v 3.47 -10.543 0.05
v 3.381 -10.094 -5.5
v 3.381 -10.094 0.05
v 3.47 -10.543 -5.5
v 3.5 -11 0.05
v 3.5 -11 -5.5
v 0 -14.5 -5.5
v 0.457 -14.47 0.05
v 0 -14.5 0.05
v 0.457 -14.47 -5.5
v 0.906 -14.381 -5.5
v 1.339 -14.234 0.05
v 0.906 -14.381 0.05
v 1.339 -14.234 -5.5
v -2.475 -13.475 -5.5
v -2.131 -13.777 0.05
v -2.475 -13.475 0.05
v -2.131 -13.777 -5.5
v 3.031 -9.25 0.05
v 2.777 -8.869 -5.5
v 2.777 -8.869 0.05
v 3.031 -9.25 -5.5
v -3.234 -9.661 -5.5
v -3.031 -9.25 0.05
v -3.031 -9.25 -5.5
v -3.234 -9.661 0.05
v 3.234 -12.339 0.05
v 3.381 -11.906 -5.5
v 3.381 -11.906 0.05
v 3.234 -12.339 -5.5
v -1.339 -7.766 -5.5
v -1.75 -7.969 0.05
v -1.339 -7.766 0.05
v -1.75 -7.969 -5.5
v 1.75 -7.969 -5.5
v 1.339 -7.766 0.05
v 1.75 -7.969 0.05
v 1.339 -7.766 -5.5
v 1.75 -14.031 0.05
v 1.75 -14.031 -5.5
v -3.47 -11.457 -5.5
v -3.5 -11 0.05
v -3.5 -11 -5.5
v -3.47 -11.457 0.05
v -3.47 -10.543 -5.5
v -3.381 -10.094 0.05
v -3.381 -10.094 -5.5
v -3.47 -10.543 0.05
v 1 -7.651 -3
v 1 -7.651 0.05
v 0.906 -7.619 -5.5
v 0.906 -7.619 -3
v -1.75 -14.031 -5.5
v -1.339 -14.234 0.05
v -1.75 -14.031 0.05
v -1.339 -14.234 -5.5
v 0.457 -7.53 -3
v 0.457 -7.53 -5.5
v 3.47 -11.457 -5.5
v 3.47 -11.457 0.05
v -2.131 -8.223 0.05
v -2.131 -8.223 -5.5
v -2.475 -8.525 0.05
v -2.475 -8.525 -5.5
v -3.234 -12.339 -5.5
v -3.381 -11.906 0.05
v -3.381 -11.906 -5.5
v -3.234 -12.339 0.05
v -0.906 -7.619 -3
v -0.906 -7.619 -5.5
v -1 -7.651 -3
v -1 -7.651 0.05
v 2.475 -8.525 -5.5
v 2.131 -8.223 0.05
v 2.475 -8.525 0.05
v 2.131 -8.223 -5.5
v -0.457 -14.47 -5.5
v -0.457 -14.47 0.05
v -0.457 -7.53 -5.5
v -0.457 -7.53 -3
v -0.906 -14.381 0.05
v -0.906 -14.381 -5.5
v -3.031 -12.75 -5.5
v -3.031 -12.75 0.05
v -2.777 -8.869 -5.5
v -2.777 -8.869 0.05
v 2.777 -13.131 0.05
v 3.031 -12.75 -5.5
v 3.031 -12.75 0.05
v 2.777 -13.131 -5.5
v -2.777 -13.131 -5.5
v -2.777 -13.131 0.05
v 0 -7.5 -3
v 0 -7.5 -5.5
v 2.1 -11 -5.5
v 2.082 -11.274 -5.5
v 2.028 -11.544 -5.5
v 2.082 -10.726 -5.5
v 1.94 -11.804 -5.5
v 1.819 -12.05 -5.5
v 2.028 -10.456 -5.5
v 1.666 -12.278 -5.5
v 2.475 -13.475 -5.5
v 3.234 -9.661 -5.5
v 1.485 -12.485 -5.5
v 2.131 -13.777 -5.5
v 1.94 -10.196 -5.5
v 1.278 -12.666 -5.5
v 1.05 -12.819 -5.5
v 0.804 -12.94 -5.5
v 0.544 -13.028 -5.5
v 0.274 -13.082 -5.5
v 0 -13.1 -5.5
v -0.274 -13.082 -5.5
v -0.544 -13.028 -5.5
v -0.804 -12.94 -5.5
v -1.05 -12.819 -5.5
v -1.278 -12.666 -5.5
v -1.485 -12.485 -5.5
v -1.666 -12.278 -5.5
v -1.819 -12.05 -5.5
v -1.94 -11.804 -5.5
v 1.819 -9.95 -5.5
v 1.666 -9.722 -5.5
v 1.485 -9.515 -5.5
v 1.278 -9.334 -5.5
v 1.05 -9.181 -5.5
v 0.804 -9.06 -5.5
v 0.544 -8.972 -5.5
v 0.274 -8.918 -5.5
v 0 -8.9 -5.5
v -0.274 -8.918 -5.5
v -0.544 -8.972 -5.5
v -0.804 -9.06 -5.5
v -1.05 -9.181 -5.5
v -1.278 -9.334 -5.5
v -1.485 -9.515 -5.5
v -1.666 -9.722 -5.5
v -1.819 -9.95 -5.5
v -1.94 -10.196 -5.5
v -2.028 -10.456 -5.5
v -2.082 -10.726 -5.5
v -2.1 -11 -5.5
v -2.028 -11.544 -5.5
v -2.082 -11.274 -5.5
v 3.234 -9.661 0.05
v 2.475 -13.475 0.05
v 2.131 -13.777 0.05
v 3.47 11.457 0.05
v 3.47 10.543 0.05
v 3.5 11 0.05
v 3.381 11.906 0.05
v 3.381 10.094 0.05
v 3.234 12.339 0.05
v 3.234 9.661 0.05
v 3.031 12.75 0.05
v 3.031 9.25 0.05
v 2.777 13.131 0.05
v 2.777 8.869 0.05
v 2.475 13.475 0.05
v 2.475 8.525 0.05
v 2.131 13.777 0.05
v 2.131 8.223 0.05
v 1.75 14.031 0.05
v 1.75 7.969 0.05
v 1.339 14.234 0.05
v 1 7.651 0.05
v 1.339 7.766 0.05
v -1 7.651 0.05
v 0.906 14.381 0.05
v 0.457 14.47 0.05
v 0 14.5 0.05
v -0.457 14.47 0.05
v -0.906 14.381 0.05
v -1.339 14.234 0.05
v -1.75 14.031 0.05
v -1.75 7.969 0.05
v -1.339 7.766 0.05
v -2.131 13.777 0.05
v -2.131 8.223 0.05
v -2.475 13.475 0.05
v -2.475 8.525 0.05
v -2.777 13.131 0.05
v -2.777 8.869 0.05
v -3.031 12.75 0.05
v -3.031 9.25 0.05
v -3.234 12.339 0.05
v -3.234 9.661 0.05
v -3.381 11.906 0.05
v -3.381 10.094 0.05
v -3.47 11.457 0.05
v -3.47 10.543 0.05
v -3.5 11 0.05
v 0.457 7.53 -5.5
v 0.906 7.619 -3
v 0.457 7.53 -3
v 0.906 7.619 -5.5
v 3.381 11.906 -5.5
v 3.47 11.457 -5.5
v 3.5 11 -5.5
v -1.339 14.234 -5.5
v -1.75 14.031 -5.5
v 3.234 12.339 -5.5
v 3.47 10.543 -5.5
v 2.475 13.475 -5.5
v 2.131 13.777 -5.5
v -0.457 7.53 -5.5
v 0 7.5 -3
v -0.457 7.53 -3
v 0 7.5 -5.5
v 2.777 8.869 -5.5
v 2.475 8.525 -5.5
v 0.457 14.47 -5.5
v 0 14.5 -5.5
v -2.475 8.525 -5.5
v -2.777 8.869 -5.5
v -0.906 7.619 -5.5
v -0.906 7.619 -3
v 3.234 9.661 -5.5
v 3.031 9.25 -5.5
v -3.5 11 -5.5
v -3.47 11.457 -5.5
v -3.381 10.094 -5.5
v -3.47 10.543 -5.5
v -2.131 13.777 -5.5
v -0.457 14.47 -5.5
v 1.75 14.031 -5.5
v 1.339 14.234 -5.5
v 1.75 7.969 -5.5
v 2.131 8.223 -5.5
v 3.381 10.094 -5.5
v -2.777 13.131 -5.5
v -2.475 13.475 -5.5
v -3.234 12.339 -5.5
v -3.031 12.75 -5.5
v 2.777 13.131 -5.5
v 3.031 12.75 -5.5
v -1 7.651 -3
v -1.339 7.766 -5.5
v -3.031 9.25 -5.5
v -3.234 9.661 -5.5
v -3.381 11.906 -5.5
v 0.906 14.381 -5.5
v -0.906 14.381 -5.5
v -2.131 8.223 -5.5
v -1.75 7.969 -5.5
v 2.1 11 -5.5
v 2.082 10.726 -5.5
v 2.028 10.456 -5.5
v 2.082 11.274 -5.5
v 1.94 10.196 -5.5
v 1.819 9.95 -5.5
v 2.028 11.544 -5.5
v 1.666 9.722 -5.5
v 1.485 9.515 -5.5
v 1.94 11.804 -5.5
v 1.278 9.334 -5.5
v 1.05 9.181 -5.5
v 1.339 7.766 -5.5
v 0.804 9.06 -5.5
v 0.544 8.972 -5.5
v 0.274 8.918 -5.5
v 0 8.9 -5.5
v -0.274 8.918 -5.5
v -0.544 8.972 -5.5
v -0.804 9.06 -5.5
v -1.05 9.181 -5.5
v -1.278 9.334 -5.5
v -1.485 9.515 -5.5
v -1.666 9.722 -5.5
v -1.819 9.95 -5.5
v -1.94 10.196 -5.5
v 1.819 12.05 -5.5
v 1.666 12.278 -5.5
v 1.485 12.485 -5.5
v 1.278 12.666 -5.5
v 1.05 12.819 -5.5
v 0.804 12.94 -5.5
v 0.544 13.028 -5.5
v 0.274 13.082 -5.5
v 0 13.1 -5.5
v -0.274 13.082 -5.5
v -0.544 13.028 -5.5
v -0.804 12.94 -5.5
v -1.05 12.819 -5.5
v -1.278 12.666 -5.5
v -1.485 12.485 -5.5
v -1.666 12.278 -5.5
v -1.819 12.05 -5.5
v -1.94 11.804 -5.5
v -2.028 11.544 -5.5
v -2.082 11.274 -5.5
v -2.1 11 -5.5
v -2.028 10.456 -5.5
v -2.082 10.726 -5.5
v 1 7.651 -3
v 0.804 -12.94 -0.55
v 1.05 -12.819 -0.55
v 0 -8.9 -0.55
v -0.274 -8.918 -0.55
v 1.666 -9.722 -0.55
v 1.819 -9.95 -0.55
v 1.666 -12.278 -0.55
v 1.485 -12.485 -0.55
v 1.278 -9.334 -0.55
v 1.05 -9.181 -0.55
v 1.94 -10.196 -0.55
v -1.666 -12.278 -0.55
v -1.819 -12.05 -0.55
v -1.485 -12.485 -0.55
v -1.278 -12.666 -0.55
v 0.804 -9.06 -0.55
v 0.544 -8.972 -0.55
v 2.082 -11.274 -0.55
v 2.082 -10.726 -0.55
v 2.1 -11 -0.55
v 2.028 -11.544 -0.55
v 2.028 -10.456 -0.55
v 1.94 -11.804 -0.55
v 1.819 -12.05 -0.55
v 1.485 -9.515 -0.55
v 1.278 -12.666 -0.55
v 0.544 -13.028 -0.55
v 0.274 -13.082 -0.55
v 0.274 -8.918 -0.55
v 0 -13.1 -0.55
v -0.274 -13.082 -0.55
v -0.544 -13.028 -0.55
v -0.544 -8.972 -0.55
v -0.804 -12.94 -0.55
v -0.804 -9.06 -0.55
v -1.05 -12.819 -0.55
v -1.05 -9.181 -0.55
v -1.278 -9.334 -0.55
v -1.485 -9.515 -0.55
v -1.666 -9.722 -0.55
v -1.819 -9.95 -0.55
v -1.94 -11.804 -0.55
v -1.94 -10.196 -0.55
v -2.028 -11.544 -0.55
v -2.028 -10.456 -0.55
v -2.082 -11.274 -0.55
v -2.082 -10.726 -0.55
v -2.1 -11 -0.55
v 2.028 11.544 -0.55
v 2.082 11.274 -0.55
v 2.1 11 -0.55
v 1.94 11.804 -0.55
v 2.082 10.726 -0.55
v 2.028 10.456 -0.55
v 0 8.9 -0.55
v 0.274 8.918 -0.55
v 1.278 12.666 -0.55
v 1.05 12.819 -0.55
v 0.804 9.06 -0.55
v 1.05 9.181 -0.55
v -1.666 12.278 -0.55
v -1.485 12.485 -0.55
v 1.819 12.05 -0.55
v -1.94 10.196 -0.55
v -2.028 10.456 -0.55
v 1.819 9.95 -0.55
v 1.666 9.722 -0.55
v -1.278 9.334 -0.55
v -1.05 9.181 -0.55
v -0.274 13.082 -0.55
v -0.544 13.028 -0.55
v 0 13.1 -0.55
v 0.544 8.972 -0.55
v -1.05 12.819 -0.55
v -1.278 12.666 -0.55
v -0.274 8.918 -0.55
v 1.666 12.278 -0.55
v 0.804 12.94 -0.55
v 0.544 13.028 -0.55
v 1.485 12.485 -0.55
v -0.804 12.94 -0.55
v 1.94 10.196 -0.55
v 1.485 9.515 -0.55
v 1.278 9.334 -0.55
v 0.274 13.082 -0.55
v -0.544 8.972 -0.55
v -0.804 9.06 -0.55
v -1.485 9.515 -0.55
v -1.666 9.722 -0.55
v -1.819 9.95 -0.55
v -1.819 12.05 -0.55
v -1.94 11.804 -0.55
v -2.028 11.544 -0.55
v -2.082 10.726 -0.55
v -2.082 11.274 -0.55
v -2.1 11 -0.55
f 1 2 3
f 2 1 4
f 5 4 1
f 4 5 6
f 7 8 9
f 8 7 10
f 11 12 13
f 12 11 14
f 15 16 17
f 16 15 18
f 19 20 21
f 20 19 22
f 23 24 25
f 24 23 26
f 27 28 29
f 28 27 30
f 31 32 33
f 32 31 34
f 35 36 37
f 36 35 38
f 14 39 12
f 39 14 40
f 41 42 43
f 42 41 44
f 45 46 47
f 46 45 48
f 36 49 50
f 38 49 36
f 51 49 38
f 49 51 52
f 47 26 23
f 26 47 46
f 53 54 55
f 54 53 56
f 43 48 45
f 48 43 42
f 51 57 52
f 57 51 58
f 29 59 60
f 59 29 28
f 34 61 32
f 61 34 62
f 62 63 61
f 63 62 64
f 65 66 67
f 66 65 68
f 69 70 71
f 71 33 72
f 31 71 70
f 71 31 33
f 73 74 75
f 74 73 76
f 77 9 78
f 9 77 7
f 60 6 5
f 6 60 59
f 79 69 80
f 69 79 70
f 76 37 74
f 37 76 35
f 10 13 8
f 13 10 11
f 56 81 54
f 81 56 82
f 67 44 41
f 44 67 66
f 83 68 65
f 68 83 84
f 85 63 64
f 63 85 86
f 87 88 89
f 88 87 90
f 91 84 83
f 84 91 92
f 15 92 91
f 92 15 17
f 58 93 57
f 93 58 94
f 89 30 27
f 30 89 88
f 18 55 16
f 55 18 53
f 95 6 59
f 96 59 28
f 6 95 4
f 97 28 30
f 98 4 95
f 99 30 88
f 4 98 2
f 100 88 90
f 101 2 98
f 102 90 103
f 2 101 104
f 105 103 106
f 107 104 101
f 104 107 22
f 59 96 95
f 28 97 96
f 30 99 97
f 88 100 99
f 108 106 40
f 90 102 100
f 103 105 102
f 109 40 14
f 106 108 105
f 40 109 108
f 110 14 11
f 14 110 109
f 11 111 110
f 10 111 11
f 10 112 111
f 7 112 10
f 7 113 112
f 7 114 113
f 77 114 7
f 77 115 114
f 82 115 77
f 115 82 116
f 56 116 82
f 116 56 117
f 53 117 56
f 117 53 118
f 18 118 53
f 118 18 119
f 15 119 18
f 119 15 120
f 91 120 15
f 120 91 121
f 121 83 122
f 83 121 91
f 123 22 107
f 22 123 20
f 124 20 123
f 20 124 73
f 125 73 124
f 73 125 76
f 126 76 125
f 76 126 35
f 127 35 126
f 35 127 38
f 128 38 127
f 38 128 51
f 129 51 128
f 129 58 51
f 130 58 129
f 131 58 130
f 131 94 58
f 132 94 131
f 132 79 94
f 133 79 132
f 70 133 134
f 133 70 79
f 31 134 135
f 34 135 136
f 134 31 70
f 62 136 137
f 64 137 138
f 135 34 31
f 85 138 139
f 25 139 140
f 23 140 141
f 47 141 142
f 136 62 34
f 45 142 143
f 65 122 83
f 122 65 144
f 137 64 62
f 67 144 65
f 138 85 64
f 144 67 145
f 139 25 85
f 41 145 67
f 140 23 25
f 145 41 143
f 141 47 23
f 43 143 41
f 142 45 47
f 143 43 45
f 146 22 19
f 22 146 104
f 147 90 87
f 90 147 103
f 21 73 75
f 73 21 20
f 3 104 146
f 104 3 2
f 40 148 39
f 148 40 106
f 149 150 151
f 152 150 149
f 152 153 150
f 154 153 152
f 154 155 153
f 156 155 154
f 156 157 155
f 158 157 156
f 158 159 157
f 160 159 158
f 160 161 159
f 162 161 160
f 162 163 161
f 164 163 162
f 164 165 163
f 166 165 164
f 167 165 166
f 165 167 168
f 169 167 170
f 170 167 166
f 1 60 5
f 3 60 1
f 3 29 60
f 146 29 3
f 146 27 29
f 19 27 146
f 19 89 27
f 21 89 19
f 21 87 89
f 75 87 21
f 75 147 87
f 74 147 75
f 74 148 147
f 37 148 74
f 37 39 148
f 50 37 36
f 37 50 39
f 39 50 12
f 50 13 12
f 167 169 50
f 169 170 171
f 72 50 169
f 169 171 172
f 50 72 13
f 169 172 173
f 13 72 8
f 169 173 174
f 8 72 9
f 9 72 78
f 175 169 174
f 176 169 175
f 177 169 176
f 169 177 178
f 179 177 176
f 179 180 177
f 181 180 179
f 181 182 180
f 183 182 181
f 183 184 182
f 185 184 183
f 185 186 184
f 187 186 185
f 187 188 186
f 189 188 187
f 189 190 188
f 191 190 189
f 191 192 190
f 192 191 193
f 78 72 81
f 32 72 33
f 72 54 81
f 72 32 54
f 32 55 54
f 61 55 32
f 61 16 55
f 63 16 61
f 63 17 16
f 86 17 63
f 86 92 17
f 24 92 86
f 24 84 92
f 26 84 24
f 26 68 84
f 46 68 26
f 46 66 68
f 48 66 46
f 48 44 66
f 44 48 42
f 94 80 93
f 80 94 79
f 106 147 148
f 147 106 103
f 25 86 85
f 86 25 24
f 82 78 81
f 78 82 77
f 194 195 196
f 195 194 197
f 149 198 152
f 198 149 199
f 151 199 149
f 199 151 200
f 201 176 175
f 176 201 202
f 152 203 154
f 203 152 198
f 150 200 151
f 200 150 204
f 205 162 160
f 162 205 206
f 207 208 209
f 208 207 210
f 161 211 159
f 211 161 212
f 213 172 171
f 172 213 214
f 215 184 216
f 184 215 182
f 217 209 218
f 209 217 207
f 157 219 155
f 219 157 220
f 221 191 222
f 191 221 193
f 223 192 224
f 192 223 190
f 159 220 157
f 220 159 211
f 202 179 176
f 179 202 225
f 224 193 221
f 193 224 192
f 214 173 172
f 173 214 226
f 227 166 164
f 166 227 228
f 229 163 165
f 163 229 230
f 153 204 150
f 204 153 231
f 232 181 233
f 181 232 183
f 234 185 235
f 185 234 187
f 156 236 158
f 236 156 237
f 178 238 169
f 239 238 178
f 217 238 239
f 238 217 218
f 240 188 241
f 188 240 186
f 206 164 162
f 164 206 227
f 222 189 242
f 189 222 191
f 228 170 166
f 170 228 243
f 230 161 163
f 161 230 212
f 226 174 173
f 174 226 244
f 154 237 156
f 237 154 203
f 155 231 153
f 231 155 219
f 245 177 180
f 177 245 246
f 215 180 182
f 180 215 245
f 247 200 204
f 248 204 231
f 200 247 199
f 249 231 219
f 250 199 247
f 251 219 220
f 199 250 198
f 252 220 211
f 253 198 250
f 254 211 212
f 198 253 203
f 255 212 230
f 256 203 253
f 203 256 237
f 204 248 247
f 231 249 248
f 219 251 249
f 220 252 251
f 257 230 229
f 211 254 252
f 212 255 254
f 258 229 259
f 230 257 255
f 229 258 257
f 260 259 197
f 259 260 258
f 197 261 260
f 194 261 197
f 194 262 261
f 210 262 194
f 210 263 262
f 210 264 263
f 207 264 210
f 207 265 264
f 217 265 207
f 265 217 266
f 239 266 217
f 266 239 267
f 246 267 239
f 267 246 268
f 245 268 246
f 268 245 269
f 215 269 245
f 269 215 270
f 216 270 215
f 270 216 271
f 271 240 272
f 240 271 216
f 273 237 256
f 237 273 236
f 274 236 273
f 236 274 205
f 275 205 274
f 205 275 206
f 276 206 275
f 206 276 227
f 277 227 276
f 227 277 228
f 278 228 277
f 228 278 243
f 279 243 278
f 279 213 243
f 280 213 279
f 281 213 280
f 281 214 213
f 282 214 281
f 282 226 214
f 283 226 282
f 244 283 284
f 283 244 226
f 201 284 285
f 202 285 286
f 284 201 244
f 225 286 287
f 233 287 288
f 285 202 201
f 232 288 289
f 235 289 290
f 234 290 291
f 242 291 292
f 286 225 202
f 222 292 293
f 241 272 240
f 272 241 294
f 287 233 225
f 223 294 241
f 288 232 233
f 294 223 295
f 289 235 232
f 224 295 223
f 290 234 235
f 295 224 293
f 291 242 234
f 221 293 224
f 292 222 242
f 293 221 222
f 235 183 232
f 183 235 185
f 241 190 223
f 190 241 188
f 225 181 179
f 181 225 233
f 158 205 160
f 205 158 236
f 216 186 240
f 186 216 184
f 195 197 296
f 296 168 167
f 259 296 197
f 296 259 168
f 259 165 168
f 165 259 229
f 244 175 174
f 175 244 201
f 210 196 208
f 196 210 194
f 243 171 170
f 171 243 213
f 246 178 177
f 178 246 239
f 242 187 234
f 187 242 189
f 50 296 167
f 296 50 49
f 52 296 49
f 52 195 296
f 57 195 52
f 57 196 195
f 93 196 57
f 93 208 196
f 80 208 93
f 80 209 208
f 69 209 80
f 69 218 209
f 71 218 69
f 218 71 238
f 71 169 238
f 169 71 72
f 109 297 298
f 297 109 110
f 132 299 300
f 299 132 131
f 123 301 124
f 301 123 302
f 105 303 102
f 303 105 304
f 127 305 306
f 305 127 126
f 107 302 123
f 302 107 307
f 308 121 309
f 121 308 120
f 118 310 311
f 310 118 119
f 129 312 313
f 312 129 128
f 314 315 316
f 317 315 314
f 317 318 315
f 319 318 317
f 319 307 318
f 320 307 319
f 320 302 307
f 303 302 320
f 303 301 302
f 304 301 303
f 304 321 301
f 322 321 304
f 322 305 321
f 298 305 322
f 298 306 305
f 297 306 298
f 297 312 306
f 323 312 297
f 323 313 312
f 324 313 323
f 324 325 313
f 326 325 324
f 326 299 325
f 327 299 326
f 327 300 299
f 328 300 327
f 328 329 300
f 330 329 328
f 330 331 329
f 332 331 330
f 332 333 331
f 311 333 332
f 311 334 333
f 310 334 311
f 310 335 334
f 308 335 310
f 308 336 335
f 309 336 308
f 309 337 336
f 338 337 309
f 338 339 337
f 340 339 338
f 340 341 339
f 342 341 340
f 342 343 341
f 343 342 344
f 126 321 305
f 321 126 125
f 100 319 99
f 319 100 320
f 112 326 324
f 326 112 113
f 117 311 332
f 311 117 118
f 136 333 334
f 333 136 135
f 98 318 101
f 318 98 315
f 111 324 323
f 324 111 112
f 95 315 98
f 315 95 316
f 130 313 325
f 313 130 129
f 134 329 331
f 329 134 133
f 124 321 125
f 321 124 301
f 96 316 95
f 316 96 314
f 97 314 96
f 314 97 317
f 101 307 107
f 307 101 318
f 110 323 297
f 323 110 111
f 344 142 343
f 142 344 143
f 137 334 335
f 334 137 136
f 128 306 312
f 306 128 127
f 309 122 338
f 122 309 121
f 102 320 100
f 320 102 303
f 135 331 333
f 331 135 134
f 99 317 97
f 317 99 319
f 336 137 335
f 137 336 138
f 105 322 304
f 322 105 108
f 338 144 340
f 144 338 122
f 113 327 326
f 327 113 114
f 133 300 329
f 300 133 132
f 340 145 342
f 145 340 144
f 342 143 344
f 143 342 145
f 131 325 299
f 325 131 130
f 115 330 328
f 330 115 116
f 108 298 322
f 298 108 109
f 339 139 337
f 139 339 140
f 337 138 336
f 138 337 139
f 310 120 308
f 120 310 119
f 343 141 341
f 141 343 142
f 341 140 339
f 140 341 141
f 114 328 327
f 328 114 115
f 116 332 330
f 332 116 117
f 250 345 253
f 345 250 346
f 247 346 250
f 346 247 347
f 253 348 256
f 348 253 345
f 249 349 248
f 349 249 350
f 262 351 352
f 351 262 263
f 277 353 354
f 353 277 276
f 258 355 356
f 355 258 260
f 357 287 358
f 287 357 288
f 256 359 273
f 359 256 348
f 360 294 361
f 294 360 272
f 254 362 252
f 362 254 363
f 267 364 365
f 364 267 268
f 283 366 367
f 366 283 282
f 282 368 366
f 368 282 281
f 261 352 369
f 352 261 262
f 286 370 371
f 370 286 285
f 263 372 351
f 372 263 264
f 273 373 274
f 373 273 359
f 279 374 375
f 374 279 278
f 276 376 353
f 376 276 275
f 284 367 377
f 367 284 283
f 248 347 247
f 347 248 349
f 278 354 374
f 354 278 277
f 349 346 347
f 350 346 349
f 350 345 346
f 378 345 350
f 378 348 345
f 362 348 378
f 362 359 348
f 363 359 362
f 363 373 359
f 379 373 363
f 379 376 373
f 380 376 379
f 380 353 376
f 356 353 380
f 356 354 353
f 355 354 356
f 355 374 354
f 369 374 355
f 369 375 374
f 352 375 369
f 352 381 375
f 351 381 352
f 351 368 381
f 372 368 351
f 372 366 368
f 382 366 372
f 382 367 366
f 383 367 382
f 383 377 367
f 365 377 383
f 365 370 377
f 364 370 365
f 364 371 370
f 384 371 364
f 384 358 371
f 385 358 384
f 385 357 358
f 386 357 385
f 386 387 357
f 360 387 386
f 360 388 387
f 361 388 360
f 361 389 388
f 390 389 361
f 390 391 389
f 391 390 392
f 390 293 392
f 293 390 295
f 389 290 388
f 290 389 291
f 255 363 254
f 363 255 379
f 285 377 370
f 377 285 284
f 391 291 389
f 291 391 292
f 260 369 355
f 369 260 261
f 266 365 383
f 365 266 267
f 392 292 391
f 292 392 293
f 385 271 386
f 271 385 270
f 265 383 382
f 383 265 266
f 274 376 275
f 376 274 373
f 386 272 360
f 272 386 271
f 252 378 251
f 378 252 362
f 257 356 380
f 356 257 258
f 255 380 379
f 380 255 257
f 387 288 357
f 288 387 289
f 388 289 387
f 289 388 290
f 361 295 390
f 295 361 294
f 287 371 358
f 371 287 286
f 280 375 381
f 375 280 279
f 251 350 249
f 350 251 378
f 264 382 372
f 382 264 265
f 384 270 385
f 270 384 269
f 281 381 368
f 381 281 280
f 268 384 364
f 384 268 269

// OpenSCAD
// Relay bracket insert boss pattern for a removable lid.

$fn = 48;

relay_bracket_screw_spacing = 22;
relay_bracket_insert_hole_diameter = 4.2;
relay_bracket_insert_depth = 5.0;
relay_bracket_boss_od = 7.0;
relay_bracket_boss_height = 5.5;
relay_boss_rib_thickness = 2.0;
relay_boss_rib_height = 3.0;

module relay_mount_boss_pair(x = 0, y = 0) {
    difference() {
        union() {
            for (dy = [-relay_bracket_screw_spacing / 2, relay_bracket_screw_spacing / 2])
                translate([x, y + dy, -relay_bracket_boss_height])
                    cylinder(h = relay_bracket_boss_height + 0.05, d = relay_bracket_boss_od);

            translate([
                x - relay_boss_rib_thickness / 2,
                y - relay_bracket_screw_spacing / 2,
                -relay_boss_rib_height
            ])
                cube([
                    relay_boss_rib_thickness,
                    relay_bracket_screw_spacing,
                    relay_boss_rib_height + 0.05
                ]);
        }

        for (dy = [-relay_bracket_screw_spacing / 2, relay_bracket_screw_spacing / 2])
            translate([x, y + dy, -relay_bracket_boss_height - 0.05])
                cylinder(
                    h = relay_bracket_insert_depth,
                    d = relay_bracket_insert_hole_diameter
                );
    }
}

relay_mount_boss_pair();
